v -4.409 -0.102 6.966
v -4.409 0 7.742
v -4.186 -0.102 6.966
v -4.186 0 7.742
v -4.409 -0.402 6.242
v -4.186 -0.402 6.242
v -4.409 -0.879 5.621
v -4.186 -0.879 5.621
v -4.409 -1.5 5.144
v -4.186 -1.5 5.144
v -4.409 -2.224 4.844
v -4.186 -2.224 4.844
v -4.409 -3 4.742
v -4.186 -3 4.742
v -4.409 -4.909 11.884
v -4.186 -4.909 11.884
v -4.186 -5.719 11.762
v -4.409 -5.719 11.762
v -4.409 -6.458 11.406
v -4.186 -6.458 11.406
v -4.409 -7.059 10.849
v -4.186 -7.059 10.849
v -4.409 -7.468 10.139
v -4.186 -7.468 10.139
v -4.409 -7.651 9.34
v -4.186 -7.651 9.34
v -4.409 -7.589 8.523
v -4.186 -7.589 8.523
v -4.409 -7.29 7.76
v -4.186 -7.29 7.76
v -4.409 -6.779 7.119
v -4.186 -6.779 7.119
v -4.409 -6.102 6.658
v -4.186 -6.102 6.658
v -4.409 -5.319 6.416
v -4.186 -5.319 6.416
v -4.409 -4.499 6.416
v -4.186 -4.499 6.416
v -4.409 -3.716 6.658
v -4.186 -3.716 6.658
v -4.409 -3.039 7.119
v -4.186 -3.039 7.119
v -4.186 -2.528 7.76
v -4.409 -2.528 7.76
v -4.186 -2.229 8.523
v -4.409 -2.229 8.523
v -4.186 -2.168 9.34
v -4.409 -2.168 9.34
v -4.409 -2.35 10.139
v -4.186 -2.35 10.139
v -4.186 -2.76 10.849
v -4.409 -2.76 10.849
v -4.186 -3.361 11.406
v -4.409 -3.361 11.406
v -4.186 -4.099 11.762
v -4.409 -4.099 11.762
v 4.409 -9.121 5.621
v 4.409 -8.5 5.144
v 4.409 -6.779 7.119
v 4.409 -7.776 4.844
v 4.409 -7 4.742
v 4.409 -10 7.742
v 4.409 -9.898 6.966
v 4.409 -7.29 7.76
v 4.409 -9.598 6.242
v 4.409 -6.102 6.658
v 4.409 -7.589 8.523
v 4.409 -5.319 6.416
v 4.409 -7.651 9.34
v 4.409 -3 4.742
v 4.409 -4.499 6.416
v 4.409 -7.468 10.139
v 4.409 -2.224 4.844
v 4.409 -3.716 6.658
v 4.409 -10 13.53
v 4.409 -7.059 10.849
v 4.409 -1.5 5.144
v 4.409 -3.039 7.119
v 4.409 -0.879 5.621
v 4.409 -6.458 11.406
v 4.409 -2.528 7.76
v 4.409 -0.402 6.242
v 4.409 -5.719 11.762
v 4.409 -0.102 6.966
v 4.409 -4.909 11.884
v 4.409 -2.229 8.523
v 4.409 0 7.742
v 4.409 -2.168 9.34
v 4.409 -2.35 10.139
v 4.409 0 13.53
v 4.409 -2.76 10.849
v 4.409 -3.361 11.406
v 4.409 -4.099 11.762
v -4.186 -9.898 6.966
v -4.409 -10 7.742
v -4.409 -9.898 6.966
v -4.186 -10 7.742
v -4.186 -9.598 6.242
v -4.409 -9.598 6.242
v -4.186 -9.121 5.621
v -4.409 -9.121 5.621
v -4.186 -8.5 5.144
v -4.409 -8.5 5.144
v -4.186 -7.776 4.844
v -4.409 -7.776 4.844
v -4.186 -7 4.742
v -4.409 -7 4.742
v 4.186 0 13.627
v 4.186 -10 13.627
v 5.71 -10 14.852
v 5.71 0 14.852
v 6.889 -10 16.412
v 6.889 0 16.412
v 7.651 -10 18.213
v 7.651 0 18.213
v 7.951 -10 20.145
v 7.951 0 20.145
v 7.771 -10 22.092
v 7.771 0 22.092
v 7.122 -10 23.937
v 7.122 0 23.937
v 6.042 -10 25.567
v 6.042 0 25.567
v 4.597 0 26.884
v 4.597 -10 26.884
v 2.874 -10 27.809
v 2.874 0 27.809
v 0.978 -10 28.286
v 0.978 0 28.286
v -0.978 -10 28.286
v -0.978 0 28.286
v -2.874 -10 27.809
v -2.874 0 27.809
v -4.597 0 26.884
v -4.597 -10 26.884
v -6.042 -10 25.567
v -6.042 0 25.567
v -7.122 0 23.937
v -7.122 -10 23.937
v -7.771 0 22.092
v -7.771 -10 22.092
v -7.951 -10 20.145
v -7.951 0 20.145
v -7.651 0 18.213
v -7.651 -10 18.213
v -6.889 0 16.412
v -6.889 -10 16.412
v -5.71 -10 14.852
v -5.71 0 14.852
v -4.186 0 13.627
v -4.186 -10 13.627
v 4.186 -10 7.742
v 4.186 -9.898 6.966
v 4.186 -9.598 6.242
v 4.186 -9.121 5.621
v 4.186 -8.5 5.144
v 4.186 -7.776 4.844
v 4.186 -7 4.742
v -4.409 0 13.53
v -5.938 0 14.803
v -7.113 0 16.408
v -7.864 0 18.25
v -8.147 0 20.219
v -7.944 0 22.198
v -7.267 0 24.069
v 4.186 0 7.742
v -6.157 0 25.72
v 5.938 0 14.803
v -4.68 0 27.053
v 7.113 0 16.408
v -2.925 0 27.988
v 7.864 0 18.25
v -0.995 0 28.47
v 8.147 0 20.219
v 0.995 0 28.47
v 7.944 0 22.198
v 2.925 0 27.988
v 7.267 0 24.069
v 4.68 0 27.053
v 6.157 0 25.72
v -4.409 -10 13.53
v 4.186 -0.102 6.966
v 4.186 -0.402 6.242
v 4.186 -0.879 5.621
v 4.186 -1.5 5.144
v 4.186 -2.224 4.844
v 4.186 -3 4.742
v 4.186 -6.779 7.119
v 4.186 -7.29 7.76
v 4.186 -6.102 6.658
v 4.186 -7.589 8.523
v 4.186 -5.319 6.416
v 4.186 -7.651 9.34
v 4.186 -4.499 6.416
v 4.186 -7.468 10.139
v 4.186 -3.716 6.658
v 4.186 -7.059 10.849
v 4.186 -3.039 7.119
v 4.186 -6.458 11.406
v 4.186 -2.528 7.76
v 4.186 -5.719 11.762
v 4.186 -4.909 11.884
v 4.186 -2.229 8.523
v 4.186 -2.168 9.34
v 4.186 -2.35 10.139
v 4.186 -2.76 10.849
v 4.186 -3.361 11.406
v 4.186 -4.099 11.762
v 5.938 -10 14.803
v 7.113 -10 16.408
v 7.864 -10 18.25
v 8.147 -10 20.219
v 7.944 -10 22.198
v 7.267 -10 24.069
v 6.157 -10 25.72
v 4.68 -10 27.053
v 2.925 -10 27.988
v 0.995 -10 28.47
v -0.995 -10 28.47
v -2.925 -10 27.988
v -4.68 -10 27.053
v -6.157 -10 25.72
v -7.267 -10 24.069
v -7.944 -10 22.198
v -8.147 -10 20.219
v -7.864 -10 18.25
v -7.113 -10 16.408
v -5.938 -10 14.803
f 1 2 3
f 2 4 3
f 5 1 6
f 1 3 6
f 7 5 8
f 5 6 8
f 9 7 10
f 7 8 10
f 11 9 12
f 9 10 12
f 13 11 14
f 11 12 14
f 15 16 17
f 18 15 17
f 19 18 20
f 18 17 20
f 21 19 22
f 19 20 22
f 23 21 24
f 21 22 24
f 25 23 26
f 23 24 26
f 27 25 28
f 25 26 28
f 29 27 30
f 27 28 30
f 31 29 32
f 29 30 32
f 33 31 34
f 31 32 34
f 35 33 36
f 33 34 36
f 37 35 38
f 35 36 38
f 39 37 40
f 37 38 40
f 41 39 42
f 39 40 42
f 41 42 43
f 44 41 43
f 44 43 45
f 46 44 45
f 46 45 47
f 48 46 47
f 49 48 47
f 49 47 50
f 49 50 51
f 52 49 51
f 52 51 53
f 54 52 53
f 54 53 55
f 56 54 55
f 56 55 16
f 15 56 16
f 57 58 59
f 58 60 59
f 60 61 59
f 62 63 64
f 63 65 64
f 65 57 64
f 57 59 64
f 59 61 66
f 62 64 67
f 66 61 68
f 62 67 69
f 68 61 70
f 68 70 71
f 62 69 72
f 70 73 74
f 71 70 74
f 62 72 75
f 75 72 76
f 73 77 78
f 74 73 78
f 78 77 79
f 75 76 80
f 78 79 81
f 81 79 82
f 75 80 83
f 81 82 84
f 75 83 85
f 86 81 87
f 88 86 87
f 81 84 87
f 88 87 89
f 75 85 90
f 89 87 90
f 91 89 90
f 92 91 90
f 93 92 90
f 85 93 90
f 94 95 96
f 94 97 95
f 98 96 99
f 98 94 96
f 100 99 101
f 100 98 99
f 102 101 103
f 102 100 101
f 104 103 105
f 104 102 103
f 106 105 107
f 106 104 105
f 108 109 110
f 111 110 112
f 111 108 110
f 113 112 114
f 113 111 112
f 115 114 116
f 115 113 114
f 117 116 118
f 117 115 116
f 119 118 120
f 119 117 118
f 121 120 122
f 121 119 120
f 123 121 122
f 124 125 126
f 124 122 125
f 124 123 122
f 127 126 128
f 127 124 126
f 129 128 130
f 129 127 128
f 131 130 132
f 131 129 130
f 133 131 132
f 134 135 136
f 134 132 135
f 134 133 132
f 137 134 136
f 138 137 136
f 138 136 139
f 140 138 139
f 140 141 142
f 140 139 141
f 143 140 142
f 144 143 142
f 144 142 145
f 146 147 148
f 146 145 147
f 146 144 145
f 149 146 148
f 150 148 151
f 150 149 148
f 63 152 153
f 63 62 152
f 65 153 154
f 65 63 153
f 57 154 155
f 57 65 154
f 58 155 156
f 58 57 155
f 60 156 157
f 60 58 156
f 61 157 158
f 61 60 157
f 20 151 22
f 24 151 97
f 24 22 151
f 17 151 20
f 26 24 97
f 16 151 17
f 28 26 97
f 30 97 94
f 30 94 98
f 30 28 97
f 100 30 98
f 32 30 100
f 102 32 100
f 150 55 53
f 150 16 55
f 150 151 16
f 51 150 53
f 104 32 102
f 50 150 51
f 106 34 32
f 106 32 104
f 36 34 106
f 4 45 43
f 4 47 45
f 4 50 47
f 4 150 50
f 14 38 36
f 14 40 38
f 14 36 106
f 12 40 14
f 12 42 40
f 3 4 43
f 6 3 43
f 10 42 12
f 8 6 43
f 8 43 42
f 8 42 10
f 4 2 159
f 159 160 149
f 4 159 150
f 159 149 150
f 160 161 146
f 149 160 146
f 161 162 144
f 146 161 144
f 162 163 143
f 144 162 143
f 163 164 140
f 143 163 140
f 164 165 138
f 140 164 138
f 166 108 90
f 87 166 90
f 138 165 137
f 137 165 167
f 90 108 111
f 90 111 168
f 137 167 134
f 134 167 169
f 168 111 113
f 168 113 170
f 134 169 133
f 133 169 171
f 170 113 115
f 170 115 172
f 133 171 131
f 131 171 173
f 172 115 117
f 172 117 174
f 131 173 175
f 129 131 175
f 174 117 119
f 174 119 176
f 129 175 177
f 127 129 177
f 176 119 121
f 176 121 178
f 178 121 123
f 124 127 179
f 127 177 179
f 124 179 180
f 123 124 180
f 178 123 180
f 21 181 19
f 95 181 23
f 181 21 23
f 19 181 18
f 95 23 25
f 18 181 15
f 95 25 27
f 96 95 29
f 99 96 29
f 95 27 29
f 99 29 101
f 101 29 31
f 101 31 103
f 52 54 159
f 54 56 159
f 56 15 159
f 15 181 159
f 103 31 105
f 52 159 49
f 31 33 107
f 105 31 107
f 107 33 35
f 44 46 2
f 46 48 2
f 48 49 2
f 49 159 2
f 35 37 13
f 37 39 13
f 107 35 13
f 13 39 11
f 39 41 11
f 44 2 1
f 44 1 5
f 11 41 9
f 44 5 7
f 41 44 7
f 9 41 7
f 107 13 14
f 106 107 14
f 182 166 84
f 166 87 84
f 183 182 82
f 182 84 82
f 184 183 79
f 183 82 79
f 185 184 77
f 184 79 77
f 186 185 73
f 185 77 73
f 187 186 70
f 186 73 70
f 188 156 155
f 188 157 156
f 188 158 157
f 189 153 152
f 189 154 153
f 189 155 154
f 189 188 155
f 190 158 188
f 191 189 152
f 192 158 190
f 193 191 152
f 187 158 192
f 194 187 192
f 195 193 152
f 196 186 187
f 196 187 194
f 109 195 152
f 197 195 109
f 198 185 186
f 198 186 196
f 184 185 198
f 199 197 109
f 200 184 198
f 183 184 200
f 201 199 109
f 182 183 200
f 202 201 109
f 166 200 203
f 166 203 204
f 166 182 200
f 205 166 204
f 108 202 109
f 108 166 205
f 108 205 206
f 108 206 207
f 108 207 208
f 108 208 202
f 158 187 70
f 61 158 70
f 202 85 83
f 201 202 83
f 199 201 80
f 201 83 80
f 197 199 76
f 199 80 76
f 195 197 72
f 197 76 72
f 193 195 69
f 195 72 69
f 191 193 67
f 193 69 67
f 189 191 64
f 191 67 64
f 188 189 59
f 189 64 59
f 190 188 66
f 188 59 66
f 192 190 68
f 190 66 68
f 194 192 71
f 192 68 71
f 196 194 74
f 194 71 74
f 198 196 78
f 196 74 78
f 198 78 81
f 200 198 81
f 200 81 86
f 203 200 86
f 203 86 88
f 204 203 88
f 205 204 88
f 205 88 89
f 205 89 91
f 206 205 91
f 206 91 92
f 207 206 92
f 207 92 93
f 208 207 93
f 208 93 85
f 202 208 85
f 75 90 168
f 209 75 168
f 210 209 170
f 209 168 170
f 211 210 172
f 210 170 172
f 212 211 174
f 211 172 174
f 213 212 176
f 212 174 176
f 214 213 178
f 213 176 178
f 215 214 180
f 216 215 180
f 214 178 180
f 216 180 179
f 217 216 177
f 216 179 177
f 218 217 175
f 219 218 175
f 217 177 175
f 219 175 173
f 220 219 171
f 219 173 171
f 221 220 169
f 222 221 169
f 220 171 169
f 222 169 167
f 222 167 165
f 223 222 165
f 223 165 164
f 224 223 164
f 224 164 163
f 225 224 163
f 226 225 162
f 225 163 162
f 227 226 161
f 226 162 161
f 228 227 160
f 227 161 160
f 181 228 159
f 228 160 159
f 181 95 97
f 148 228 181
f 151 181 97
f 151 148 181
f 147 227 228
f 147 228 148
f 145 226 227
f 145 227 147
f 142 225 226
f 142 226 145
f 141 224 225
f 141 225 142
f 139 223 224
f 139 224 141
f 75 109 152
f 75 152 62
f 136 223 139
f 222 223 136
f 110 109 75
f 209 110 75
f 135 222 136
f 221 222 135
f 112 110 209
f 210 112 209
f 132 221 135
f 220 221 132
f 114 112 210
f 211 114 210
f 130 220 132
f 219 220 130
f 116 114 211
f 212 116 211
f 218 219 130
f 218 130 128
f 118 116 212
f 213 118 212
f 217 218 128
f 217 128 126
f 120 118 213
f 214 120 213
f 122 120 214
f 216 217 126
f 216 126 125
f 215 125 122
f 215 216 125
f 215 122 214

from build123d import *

# Parameters (mm, degrees)
PAD_DEPTH       = 10
POCKET_DEPTH    = 10.001
SKETCH002_R     = 2.749127
POCKET001_DEPTH = 12.55872
FILLET_R        = 3


with BuildPart() as part:
    # Sketch → Pad (new body)
    with BuildSketch(Plane.XZ):
        with BuildLine():
            ThreePointArc((4.409319, 13.530378), (0, 28.531103), (-4.409319, 13.530378))
            Line((-4.409319, 13.530378), (-4.409319, 4.742104))
            Line((-4.409319, 4.742104), (4.409319, 4.742104))
            Line((4.409319, 4.742104), (4.409319, 13.530378))
        make_face()
    extrude(amount=PAD_DEPTH)

    # Sketch001 → Pocket (cut, through all)
    with BuildSketch(Plane.XZ):
        with BuildLine():
            ThreePointArc((4.186002, 13.626635), (0, 28.346632), (-4.186002, 13.626635))
            Line((-4.186002, 13.626635), (-4.186002, 4.191096))
            Line((-4.186002, 4.191096), (4.186002, 4.191096))
            Line((4.186002, 4.191096), (4.186002, 13.626635))
        make_face()
    extrude(amount=POCKET_DEPTH, mode=Mode.SUBTRACT)

    # Sketch002 (on Face2 of Pocket) → Pocket001 (cut, through all)
    with BuildSketch(Plane(origin=(4.409319, 0, 0), x_dir=(0, 0, 1), z_dir=(1, 0, 0))):
        with Locations((9.13458, 4.909179)):
            Circle(SKETCH002_R)
    extrude(amount=-POCKET001_DEPTH, mode=Mode.SUBTRACT)

    # Fillet
    fillet_edges = [part.edges().sort_by_distance(p)[0] for p in [
        (4.297661, -10, 4.742104),
        (-4.297661, -10, 4.742104),
        (-4.297661, 0, 4.742104),
        (4.297661, 0, 4.742104),
    ]]
    fillet(fillet_edges, radius=FILLET_R)


solid = part.part
